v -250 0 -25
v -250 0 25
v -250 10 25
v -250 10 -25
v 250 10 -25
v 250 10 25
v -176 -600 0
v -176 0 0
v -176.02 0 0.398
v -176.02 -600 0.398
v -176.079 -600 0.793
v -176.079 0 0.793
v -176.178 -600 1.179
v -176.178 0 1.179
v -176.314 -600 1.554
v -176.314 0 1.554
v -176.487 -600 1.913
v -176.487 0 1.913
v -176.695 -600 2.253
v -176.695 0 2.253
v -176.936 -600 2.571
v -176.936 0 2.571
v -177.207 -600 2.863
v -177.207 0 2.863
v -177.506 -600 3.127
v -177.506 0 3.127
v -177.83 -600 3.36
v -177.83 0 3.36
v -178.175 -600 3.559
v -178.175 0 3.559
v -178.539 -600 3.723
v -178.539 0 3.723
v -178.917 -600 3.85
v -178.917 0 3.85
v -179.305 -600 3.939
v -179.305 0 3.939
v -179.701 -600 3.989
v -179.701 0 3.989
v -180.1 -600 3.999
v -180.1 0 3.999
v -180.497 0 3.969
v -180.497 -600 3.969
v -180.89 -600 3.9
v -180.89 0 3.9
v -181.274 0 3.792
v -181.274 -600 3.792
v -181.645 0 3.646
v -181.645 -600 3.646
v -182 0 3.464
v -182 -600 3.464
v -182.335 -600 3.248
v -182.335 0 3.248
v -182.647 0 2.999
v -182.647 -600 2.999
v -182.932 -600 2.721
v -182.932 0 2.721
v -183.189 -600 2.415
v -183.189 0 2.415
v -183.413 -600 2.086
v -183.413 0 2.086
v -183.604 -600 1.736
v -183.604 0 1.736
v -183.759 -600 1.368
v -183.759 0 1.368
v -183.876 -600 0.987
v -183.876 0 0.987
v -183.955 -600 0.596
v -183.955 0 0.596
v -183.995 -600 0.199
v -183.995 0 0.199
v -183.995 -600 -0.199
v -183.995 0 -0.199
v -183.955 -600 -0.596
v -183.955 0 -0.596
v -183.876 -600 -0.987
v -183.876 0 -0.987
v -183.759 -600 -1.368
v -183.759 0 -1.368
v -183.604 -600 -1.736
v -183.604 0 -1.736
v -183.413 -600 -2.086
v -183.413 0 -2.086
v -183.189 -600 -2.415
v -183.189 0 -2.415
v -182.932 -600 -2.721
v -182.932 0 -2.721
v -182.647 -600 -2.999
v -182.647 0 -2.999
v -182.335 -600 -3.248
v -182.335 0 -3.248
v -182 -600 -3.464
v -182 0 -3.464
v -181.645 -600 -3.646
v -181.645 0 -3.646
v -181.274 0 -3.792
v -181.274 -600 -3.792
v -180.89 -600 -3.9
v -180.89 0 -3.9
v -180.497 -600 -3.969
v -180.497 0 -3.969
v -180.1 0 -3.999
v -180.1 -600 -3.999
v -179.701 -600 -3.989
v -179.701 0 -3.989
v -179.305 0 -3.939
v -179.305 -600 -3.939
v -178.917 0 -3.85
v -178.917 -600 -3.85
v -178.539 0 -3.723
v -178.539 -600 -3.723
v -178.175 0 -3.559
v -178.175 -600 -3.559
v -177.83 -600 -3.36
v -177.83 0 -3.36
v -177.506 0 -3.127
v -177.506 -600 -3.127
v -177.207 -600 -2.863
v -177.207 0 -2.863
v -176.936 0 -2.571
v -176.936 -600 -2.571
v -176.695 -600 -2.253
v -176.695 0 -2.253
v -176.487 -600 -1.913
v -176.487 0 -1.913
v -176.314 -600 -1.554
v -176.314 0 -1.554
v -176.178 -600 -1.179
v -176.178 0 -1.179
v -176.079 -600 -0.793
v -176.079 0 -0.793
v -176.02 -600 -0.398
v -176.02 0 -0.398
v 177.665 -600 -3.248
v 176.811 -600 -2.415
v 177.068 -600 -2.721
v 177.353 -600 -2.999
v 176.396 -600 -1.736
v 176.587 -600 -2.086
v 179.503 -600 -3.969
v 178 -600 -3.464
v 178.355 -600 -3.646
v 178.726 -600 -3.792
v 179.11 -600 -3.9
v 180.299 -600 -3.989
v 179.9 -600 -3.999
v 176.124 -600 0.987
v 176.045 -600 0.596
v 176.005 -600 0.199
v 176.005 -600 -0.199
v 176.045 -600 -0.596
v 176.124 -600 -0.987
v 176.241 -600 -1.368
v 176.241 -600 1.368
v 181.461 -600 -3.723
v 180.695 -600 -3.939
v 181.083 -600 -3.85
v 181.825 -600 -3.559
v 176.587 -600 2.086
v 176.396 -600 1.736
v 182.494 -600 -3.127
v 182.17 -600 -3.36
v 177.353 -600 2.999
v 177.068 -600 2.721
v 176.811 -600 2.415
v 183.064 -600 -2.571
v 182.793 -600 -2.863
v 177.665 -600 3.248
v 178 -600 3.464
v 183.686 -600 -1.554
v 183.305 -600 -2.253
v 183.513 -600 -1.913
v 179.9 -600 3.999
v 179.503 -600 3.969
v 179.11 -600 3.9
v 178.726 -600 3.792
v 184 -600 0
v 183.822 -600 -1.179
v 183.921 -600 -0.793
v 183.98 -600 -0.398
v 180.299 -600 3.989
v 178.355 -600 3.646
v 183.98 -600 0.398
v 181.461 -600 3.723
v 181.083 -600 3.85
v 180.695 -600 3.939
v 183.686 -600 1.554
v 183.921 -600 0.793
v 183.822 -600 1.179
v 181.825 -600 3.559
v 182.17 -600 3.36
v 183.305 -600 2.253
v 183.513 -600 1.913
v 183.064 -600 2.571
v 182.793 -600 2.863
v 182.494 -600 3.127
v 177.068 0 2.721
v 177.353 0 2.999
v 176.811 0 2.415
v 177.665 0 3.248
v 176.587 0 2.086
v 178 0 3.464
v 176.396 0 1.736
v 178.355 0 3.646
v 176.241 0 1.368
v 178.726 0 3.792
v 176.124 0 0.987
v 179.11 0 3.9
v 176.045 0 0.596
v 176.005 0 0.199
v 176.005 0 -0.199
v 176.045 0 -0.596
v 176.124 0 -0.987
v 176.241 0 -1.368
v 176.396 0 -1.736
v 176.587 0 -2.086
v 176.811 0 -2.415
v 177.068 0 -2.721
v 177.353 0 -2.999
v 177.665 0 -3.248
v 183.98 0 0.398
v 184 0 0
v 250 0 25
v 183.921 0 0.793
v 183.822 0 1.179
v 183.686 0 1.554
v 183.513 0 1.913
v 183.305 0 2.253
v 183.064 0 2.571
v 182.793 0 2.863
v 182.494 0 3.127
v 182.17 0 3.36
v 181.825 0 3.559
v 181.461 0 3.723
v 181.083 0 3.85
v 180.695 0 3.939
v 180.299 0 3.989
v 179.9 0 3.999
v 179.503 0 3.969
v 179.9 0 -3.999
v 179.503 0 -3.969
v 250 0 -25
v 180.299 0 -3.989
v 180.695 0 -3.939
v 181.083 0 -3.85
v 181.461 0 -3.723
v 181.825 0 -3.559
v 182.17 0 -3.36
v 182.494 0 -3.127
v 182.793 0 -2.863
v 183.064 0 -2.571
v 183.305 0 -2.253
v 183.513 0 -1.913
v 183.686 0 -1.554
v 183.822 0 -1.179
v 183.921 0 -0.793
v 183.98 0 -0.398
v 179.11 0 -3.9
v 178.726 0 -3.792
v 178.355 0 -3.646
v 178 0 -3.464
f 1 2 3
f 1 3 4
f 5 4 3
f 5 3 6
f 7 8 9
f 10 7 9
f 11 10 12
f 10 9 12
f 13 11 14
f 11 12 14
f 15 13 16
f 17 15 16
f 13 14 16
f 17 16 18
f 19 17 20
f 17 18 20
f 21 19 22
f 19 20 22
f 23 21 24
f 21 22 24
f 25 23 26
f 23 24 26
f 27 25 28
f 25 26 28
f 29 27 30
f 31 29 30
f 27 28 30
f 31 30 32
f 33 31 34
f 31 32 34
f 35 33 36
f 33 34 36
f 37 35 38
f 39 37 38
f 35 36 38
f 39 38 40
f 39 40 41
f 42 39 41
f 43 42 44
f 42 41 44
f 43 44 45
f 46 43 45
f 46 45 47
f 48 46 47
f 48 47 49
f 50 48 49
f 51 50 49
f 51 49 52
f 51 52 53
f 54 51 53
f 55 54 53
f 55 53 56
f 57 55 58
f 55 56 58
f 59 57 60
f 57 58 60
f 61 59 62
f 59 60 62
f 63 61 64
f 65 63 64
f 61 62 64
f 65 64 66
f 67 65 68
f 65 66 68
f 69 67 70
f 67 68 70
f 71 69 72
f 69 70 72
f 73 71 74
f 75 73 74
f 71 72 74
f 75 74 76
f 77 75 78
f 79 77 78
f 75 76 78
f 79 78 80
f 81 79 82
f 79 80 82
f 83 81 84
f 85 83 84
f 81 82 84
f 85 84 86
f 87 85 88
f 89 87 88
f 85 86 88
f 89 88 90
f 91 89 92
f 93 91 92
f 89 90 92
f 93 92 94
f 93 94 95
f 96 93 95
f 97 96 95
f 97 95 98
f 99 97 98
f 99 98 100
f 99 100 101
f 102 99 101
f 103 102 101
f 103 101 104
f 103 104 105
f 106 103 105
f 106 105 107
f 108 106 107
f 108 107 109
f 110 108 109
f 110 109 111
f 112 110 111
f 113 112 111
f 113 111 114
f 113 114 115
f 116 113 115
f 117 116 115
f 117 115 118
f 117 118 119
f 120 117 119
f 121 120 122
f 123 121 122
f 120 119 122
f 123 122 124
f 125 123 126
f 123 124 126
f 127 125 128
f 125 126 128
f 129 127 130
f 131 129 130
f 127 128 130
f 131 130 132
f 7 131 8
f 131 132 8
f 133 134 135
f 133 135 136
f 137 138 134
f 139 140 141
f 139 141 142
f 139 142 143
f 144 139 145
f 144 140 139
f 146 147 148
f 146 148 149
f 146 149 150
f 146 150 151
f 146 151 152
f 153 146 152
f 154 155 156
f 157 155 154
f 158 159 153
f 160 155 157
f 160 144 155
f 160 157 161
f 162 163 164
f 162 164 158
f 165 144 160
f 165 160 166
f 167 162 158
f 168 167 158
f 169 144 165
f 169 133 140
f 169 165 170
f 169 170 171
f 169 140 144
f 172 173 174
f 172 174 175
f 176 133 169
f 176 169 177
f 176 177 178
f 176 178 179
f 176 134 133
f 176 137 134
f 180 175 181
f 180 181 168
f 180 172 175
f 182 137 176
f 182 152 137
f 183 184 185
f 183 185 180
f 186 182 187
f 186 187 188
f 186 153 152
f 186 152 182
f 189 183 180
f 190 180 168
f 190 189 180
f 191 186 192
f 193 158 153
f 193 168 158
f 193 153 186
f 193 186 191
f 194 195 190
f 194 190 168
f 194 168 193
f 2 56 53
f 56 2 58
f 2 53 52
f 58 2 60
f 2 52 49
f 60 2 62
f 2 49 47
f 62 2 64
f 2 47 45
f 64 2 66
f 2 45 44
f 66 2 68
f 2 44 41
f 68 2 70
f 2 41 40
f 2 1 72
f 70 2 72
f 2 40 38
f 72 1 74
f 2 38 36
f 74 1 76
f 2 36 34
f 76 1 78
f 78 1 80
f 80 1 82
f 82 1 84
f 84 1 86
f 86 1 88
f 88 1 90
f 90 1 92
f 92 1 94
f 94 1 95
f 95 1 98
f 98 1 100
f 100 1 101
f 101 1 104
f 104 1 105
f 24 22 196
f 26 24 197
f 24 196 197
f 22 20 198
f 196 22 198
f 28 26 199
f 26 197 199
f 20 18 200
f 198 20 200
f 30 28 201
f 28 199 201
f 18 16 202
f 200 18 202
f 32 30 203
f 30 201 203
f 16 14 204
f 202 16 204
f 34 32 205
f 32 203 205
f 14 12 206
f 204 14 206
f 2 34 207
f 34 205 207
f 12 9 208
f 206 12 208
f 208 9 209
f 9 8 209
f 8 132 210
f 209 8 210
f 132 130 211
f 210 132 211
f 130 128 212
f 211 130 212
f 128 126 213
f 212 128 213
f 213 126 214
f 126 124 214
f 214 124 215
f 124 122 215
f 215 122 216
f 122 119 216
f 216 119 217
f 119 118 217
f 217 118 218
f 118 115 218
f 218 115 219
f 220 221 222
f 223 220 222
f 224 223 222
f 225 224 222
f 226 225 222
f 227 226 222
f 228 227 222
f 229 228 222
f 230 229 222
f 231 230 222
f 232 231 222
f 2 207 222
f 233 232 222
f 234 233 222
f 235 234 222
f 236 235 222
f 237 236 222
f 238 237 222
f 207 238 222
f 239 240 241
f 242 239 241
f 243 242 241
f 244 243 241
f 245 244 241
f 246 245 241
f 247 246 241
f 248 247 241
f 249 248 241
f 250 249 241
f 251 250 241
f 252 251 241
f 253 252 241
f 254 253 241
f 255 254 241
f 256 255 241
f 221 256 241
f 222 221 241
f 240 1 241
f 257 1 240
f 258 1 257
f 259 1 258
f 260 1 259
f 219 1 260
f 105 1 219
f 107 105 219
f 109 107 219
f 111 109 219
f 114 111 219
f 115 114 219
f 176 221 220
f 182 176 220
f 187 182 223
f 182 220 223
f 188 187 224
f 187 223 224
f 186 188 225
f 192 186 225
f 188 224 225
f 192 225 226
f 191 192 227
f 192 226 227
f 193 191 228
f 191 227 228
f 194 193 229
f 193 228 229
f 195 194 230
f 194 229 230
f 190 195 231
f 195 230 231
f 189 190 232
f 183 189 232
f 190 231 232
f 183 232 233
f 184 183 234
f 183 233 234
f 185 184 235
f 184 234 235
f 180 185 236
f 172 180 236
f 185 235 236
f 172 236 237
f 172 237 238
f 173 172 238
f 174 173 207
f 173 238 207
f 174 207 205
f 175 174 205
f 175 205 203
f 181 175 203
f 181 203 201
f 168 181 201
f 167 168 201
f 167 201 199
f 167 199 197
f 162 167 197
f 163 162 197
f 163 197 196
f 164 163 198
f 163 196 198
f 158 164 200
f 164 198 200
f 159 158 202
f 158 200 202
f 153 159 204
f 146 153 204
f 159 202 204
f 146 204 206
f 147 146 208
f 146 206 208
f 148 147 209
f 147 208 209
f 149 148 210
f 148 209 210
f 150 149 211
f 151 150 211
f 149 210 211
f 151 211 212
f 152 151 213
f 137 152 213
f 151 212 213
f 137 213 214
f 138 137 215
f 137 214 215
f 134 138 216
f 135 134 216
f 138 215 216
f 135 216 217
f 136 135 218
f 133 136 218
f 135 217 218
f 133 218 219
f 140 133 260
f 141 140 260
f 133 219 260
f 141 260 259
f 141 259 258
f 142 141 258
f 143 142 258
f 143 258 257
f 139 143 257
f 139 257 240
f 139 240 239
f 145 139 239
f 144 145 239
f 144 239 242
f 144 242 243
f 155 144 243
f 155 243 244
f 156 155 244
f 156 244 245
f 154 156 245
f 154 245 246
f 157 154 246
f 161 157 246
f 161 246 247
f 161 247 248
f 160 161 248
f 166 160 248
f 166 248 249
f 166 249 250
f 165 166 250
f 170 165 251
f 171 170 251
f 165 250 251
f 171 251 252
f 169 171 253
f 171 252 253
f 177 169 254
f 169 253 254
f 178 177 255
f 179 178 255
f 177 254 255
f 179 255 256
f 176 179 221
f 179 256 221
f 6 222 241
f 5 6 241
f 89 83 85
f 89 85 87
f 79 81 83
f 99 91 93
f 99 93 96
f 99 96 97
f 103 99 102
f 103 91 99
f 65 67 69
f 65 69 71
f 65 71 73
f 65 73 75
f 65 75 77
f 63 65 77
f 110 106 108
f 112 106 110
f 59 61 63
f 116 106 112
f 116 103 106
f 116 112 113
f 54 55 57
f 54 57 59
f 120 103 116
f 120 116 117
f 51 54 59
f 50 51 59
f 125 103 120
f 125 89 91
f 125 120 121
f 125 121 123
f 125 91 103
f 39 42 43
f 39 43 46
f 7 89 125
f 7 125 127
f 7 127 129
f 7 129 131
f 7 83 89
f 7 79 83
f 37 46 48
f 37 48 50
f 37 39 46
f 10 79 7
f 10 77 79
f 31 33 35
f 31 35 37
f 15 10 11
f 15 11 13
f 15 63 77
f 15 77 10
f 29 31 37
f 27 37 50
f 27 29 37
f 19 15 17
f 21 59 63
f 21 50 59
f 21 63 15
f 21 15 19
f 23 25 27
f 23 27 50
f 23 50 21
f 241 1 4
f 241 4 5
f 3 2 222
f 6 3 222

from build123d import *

# Parameters (mm, degrees)
SKETCH1_W           = 500
SKETCH1_H           = 50
BOSS_EXTRUDE1_DEPTH = 10
SKETCH2_R           = 4
BOSS_EXTRUDE2_DEPTH = 600
SKETCH6_R           = 4
BOSS_EXTRUDE3_DEPTH = 600


with BuildPart() as part:
    # Sketch1 → Boss-Extrude1 (new body)
    with BuildSketch(Plane(origin=(0, 0, 0), x_dir=(1, 0, 0), z_dir=(0, 1, 0))):
        Rectangle(SKETCH1_W, SKETCH1_H)
    extrude(amount=BOSS_EXTRUDE1_DEPTH)

    # Sketch2 → Boss-Extrude2 (add)
    with BuildSketch(Plane.XZ):
        with Locations((180, 0)):
            Circle(SKETCH2_R)
    extrude(amount=BOSS_EXTRUDE2_DEPTH)

    # Sketch6 → Boss-Extrude3 (add)
    with BuildSketch(Plane.XZ):
        with Locations((-180, 0)):
            Circle(SKETCH6_R)
    extrude(amount=BOSS_EXTRUDE3_DEPTH)


solid = part.part
